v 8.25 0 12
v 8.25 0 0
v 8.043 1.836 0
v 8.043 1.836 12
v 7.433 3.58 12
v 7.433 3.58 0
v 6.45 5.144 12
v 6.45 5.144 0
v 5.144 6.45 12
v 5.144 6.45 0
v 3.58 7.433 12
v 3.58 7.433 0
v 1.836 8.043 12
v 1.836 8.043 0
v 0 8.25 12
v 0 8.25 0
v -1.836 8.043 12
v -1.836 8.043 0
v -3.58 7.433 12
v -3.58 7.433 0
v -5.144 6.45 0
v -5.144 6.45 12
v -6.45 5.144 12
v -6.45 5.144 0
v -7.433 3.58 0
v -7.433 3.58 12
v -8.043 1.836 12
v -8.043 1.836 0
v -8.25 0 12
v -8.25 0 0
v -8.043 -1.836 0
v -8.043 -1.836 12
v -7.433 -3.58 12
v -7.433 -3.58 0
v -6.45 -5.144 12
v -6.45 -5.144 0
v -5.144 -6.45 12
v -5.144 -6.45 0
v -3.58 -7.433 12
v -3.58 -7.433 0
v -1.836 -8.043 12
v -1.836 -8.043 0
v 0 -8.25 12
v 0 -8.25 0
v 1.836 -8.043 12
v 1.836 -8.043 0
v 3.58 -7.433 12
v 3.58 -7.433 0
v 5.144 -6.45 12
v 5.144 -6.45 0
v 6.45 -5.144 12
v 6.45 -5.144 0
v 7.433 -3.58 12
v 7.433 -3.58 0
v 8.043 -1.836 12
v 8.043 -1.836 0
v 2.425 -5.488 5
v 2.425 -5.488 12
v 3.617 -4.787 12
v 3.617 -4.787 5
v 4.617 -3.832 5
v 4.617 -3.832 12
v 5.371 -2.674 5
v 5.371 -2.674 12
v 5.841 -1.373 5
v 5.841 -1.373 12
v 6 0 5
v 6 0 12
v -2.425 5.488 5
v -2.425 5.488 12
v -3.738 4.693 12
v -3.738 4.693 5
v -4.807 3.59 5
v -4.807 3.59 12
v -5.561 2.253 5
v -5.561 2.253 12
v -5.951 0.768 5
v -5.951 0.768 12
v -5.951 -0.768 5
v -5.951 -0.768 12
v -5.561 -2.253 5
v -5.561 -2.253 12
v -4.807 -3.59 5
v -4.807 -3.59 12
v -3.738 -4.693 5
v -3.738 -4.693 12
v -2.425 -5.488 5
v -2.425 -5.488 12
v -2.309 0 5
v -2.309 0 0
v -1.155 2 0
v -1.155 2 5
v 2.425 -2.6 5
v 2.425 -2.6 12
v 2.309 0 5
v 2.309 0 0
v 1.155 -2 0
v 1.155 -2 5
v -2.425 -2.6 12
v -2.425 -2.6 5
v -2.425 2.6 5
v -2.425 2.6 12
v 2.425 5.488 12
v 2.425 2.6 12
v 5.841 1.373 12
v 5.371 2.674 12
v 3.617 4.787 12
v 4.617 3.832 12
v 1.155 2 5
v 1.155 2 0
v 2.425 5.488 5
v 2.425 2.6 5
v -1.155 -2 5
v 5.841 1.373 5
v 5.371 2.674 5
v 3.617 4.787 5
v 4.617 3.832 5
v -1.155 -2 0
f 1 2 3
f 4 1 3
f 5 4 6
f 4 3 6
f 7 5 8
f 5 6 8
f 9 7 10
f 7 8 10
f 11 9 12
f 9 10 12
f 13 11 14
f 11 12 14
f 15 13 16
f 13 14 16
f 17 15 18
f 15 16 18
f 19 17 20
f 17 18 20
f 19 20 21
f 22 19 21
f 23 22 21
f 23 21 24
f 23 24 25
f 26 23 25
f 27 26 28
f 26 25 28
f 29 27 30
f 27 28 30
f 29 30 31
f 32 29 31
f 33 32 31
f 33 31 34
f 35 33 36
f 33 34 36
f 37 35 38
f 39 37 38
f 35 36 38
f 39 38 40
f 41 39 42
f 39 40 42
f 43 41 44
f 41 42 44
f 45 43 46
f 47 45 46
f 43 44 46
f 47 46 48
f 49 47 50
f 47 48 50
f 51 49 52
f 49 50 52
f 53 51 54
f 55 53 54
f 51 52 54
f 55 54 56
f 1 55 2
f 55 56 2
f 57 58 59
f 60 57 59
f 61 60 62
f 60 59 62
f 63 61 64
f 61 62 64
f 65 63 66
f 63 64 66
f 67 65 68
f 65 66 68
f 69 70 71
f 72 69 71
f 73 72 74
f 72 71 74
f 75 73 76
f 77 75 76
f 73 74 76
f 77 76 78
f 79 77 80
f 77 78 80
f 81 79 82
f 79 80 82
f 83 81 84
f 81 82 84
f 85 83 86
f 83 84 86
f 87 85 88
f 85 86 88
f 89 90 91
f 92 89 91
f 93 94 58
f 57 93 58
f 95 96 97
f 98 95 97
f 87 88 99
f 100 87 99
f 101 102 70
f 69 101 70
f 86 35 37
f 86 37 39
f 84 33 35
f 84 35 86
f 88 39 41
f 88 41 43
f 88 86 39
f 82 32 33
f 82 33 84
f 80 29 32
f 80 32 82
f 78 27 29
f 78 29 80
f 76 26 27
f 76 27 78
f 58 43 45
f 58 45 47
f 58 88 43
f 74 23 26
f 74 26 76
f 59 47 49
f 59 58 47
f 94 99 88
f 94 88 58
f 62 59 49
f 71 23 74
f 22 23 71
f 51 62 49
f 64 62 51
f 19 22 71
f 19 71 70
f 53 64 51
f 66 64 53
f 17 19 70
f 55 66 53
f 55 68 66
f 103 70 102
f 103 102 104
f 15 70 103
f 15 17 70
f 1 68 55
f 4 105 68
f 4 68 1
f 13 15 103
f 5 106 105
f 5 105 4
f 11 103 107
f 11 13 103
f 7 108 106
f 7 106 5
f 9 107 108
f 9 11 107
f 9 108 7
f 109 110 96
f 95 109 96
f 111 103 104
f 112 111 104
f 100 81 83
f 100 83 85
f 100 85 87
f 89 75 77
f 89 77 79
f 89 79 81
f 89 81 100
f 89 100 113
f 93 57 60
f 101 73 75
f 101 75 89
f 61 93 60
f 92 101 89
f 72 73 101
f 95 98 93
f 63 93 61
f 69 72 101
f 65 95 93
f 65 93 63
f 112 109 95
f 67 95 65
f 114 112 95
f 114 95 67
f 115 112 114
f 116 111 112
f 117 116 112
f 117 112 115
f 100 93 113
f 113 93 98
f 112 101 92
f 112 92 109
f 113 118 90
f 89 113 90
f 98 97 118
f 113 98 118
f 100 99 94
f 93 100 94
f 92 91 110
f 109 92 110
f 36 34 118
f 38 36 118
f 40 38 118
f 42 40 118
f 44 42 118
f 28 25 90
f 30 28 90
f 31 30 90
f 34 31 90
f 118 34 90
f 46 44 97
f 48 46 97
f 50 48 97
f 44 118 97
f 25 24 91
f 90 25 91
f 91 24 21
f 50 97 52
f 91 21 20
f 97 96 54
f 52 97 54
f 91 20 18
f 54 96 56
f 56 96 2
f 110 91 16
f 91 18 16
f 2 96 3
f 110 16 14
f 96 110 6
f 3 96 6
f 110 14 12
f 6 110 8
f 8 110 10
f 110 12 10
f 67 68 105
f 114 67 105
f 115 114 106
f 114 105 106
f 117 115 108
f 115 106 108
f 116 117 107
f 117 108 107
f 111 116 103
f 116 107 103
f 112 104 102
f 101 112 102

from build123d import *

# Parameters (mm, degrees)
SKETCH1_R           = 8.25
BOSS_EXTRUDE1_DEPTH = 12
CUT_EXTRUDE1_DEPTH  = 7
CUT_EXTRUDE2_DEPTH  = 17.736935203


with BuildPart() as part:
    # Sketch1 → Boss-Extrude1 (new body)
    with BuildSketch(Plane.XY):
        Circle(SKETCH1_R)
    extrude(amount=BOSS_EXTRUDE1_DEPTH)

    # Sketch2 → Cut-Extrude1 (cut)
    with BuildSketch(Plane.XY.offset(12)):
        with BuildLine():
            Line((-2.425, 2.6), (-2.425, 5.488112153))
            ThreePointArc((-2.425, 5.488112153), (-6, 0), (-2.425, -5.488112153))
            Line((-2.425, -5.488112153), (-2.425, -2.6))
            Line((-2.425, -2.6), (2.425, -2.6))
            Line((2.425, -2.6), (2.425, -5.488112153))
            ThreePointArc((2.425, -5.488112153), (5.027424788, -3.274904579), (6, 0))
            ThreePointArc((6, 0), (5.027424788, 3.274904579), (2.425, 5.488112153))
            Line((2.425, 5.488112153), (2.425, 2.6))
            Line((2.425, 2.6), (-2.425, 2.6))
        make_face()
    extrude(amount=-CUT_EXTRUDE1_DEPTH, mode=Mode.SUBTRACT)

    # Sketch3 → Cut-Extrude2 (cut, through all)
    with BuildSketch(Plane(origin=(0, 0, 0), x_dir=(-1, 0, 0), z_dir=(0, 0, -1))):
        Polygon((2.309401077, 0), (1.154700538, 2), (-1.154700538, 2), (-2.309401077, 0), (-1.154700538, -2), (1.154700538, -2), align=None)
    extrude(amount=-CUT_EXTRUDE2_DEPTH, mode=Mode.SUBTRACT)


solid = part.part
